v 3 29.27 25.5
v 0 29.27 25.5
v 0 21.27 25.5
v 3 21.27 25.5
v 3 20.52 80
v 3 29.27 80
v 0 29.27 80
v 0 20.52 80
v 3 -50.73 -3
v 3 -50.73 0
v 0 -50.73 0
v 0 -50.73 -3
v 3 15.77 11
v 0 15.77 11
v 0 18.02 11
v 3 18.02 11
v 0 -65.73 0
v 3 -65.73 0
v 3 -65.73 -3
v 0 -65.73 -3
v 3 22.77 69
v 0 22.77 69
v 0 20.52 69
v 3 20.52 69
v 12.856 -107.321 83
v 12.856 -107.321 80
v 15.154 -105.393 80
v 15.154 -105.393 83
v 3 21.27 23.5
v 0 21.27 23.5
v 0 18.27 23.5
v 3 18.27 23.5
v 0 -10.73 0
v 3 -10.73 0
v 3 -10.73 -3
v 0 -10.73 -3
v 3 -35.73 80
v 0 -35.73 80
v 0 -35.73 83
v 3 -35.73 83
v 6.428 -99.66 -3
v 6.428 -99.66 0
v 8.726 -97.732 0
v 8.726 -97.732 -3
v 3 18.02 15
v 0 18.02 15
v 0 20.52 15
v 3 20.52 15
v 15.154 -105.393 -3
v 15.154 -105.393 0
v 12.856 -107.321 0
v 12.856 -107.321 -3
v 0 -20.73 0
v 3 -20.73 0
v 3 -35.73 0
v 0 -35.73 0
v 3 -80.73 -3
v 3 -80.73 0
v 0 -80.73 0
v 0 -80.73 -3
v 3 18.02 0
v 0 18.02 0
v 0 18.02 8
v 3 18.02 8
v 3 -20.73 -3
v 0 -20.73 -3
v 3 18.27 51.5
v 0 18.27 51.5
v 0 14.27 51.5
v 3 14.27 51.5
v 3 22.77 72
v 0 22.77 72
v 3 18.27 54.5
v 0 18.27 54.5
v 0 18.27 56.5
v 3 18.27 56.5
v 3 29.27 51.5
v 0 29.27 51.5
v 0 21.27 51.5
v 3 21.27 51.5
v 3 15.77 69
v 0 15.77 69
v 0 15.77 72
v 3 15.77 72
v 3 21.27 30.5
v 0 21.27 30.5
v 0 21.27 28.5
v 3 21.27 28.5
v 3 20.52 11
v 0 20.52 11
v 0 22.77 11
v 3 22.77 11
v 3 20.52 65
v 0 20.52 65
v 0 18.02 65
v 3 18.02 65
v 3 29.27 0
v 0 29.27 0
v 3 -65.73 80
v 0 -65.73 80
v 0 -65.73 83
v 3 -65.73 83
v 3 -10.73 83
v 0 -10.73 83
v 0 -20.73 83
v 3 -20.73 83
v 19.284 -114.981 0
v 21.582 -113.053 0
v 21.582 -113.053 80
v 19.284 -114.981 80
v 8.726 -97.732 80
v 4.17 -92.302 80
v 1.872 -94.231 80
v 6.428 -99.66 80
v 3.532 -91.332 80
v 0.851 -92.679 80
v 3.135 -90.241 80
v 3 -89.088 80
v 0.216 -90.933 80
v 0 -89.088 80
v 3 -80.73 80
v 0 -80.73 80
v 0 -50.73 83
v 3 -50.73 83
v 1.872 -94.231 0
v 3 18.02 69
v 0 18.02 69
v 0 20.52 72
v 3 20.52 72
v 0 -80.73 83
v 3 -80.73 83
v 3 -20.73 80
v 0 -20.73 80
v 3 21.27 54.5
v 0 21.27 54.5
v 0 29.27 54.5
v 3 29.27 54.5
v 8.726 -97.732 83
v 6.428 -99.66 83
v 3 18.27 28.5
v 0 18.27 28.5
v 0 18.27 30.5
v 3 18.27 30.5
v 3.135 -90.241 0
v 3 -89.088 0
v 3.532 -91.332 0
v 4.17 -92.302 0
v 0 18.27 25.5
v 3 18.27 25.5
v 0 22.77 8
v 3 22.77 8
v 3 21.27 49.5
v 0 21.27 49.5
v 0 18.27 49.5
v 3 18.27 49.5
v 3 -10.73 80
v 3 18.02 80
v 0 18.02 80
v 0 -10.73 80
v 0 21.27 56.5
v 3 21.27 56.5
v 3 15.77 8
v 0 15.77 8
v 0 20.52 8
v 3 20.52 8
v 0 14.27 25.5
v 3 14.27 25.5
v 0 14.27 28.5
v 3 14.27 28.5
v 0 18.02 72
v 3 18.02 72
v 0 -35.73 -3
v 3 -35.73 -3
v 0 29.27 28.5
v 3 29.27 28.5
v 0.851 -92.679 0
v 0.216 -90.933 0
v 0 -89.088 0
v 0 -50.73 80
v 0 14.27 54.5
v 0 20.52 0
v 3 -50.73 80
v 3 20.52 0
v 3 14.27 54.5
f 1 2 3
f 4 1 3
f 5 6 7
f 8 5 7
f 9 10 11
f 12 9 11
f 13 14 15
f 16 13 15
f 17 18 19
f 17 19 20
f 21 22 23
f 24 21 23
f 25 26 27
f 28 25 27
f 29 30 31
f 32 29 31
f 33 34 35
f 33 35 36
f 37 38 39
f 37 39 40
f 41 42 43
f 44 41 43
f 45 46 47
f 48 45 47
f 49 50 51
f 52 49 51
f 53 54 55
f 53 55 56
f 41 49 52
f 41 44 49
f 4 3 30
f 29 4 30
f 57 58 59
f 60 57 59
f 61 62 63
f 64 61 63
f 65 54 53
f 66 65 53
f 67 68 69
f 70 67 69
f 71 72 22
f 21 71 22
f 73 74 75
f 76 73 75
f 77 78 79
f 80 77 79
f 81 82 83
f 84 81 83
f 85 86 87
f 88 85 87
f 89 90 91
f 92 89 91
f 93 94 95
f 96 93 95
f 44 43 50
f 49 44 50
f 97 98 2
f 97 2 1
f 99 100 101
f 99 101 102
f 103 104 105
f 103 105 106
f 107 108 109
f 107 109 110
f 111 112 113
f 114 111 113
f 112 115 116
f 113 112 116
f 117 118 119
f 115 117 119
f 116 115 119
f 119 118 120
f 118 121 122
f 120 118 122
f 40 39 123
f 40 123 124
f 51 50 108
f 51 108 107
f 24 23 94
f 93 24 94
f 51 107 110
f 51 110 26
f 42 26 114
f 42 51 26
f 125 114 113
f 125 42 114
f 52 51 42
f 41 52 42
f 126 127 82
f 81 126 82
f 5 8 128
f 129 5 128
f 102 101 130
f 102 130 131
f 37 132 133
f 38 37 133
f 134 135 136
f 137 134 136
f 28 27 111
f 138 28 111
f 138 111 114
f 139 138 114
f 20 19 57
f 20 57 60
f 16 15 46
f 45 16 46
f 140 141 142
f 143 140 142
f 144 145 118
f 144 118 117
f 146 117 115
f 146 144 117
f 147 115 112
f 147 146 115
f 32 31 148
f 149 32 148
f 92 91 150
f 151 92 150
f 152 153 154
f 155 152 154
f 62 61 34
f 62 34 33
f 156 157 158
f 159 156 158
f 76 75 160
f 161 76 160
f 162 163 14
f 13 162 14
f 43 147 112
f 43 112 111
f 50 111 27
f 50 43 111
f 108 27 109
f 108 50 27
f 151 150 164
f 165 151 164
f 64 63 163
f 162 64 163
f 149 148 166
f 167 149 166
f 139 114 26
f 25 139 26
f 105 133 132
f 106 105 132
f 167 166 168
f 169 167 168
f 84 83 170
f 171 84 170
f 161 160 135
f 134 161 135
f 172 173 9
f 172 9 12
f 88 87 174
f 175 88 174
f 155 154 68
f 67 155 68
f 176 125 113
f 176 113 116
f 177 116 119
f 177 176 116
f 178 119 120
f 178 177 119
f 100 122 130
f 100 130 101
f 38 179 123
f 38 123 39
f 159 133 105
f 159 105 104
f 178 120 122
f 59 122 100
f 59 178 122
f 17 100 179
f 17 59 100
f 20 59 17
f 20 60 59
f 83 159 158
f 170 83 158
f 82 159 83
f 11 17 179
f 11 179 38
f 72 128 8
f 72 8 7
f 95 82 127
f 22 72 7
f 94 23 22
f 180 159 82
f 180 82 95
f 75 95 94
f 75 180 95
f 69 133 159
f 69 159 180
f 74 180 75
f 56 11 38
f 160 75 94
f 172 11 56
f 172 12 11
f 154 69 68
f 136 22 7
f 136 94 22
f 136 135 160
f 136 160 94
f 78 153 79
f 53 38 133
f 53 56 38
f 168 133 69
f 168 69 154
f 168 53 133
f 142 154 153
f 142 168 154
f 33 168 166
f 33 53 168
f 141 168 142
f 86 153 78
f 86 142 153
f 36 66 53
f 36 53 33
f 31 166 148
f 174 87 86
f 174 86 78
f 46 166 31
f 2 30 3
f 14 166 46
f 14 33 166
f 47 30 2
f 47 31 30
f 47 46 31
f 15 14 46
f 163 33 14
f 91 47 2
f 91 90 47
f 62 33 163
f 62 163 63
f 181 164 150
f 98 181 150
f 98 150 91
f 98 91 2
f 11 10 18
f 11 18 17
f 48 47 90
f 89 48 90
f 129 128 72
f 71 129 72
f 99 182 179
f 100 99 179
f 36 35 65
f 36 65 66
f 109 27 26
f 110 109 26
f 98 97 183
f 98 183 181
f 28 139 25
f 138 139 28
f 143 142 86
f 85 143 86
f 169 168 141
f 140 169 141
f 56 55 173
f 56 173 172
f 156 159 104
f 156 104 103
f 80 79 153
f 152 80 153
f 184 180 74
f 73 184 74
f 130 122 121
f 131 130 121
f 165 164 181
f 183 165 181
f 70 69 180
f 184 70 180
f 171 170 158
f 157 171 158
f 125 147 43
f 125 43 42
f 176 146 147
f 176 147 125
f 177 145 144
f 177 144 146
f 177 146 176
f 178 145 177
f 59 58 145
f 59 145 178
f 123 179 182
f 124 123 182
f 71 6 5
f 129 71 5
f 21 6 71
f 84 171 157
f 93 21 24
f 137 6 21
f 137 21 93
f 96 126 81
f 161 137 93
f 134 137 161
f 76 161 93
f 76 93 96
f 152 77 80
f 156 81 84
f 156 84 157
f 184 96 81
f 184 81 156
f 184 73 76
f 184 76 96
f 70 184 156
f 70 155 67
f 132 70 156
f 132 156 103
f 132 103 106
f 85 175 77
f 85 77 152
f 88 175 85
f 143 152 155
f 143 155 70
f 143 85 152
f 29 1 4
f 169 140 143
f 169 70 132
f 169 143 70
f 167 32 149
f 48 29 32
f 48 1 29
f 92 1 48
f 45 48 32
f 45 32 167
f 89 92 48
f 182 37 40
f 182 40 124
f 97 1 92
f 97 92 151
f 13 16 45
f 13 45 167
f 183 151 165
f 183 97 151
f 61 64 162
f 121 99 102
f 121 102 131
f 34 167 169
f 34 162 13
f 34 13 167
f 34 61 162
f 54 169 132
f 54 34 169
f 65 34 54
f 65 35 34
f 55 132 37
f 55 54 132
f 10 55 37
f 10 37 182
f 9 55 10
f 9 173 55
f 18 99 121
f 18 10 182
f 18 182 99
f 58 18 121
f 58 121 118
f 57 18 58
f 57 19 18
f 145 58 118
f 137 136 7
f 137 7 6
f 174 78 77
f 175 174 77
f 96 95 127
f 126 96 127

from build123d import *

# Parameters (mm, degrees)
BRIDA_BASE1_DEPTH       = 80
CROQUIS13_W             = 3
CROQUIS13_H             = 10
CROQUIS13_H_2           = 15
SALIENTE_EXTRUIR2_DEPTH = 3
CROQUIS14_W             = 3
CROQUIS14_H             = 10
CROQUIS14_H_2           = 15
SALIENTE_EXTRUIR3_DEPTH = 3
CORTAR_EXTRUIR1_DEPTH   = 10


# Sheet-metal steps are written as plain solids
with BuildPart() as part:
    # Croquis7 → Brida base1 (new body)
    with BuildSketch(Plane.XY):
        with BuildLine():
            Line((3, 29.270313854), (3, 0))
            Line((3, 0), (3, -89.088238126))
            ThreePointArc((3, -89.088238126), (3.301536896, -90.798338842), (4.169777784, -92.302176174))
            Line((4.169777784, -92.302176174), (21.58176162, -113.052970465))
            Line((21.58176162, -113.052970465), (19.283628291, -114.981333294))
            Line((19.283628291, -114.981333294), (1.871644455, -94.230539003))
            ThreePointArc((1.871644455, -94.230539003), (0.482459034, -91.824399272), (0, -89.088238126))
            Line((0, -89.088238126), (0, 0))
            Line((0, 0), (0, 29.270313854))
            Line((0, 29.270313854), (3, 29.270313854))
        make_face()
    extrude(amount=BRIDA_BASE1_DEPTH)

    # Croquis13 → Saliente-Extruir2 (add)
    with BuildSketch(Plane.XY.offset(80)):
        with Locations((1.5, -15.729686146)):
            Rectangle(CROQUIS13_W, CROQUIS13_H)
        Polygon((12.855752194, -107.320888862), (15.153885523, -105.392526033), (8.726009426, -97.732081602), (6.427876097, -99.660444431), align=None)
        with Locations((1.5, -43.229686146)):
            Rectangle(CROQUIS13_W, CROQUIS13_H_2)
        with Locations((1.5, -73.229686146)):
            Rectangle(CROQUIS13_W, CROQUIS13_H_2)
    extrude(amount=SALIENTE_EXTRUIR2_DEPTH)

    # Croquis14 → Saliente-Extruir3 (add)
    with BuildSketch(Plane(origin=(0, 0, 0), x_dir=(-1, 0, 0), z_dir=(0, 0, -1))):
        with Locations((-1.5, -15.729686146)):
            Rectangle(CROQUIS14_W, CROQUIS14_H)
        Polygon((-15.153885523, -105.392526033), (-12.855752194, -107.320888862), (-6.427876097, -99.660444431), (-8.726009426, -97.732081602), align=None)
        with Locations((-1.5, -43.229686146)):
            Rectangle(CROQUIS14_W, CROQUIS14_H_2)
        with Locations((-1.5, -73.229686146)):
            Rectangle(CROQUIS14_W, CROQUIS14_H_2)
    extrude(amount=SALIENTE_EXTRUIR3_DEPTH)

    # Croquis15 → Cortar-Extruir1 (cut)
    with BuildSketch(Plane.ZY):
        Polygon((8, 20.520313854), (0, 20.520313854), (0, 18.020313854), (8, 18.020313854), (8, 15.770313854), (11, 15.770313854), (11, 18.020313854), (15, 18.020313854), (15, 20.520313854), (11, 20.520313854), (11, 22.770313854), (8, 22.770313854), align=None)
        Polygon((80, 18.020313854), (80, 20.520313854), (72, 20.520313854), (72, 22.770313854), (69, 22.770313854), (69, 20.520313854), (65, 20.520313854), (65, 18.020313854), (69, 18.020313854), (69, 15.770313854), (72, 15.770313854), (72, 18.020313854), align=None)
        Polygon((54.5, 29.270313854), (51.5, 29.270313854), (51.5, 21.270313854), (49.5, 21.270313854), (49.5, 18.270313854), (51.5, 18.270313854), (51.5, 14.270313854), (54.5, 14.270313854), (54.5, 18.270313854), (56.5, 18.270313854), (56.5, 21.270313854), (54.5, 21.270313854), align=None)
        Polygon((28.5, 29.270313854), (25.5, 29.270313854), (25.5, 21.270313854), (23.5, 21.270313854), (23.5, 18.270313854), (25.5, 18.270313854), (25.5, 14.270313854), (28.5, 14.270313854), (28.5, 18.270313854), (30.5, 18.270313854), (30.5, 21.270313854), (28.5, 21.270313854), align=None)
    extrude(amount=-CORTAR_EXTRUIR1_DEPTH, mode=Mode.SUBTRACT)


solid = part.part
